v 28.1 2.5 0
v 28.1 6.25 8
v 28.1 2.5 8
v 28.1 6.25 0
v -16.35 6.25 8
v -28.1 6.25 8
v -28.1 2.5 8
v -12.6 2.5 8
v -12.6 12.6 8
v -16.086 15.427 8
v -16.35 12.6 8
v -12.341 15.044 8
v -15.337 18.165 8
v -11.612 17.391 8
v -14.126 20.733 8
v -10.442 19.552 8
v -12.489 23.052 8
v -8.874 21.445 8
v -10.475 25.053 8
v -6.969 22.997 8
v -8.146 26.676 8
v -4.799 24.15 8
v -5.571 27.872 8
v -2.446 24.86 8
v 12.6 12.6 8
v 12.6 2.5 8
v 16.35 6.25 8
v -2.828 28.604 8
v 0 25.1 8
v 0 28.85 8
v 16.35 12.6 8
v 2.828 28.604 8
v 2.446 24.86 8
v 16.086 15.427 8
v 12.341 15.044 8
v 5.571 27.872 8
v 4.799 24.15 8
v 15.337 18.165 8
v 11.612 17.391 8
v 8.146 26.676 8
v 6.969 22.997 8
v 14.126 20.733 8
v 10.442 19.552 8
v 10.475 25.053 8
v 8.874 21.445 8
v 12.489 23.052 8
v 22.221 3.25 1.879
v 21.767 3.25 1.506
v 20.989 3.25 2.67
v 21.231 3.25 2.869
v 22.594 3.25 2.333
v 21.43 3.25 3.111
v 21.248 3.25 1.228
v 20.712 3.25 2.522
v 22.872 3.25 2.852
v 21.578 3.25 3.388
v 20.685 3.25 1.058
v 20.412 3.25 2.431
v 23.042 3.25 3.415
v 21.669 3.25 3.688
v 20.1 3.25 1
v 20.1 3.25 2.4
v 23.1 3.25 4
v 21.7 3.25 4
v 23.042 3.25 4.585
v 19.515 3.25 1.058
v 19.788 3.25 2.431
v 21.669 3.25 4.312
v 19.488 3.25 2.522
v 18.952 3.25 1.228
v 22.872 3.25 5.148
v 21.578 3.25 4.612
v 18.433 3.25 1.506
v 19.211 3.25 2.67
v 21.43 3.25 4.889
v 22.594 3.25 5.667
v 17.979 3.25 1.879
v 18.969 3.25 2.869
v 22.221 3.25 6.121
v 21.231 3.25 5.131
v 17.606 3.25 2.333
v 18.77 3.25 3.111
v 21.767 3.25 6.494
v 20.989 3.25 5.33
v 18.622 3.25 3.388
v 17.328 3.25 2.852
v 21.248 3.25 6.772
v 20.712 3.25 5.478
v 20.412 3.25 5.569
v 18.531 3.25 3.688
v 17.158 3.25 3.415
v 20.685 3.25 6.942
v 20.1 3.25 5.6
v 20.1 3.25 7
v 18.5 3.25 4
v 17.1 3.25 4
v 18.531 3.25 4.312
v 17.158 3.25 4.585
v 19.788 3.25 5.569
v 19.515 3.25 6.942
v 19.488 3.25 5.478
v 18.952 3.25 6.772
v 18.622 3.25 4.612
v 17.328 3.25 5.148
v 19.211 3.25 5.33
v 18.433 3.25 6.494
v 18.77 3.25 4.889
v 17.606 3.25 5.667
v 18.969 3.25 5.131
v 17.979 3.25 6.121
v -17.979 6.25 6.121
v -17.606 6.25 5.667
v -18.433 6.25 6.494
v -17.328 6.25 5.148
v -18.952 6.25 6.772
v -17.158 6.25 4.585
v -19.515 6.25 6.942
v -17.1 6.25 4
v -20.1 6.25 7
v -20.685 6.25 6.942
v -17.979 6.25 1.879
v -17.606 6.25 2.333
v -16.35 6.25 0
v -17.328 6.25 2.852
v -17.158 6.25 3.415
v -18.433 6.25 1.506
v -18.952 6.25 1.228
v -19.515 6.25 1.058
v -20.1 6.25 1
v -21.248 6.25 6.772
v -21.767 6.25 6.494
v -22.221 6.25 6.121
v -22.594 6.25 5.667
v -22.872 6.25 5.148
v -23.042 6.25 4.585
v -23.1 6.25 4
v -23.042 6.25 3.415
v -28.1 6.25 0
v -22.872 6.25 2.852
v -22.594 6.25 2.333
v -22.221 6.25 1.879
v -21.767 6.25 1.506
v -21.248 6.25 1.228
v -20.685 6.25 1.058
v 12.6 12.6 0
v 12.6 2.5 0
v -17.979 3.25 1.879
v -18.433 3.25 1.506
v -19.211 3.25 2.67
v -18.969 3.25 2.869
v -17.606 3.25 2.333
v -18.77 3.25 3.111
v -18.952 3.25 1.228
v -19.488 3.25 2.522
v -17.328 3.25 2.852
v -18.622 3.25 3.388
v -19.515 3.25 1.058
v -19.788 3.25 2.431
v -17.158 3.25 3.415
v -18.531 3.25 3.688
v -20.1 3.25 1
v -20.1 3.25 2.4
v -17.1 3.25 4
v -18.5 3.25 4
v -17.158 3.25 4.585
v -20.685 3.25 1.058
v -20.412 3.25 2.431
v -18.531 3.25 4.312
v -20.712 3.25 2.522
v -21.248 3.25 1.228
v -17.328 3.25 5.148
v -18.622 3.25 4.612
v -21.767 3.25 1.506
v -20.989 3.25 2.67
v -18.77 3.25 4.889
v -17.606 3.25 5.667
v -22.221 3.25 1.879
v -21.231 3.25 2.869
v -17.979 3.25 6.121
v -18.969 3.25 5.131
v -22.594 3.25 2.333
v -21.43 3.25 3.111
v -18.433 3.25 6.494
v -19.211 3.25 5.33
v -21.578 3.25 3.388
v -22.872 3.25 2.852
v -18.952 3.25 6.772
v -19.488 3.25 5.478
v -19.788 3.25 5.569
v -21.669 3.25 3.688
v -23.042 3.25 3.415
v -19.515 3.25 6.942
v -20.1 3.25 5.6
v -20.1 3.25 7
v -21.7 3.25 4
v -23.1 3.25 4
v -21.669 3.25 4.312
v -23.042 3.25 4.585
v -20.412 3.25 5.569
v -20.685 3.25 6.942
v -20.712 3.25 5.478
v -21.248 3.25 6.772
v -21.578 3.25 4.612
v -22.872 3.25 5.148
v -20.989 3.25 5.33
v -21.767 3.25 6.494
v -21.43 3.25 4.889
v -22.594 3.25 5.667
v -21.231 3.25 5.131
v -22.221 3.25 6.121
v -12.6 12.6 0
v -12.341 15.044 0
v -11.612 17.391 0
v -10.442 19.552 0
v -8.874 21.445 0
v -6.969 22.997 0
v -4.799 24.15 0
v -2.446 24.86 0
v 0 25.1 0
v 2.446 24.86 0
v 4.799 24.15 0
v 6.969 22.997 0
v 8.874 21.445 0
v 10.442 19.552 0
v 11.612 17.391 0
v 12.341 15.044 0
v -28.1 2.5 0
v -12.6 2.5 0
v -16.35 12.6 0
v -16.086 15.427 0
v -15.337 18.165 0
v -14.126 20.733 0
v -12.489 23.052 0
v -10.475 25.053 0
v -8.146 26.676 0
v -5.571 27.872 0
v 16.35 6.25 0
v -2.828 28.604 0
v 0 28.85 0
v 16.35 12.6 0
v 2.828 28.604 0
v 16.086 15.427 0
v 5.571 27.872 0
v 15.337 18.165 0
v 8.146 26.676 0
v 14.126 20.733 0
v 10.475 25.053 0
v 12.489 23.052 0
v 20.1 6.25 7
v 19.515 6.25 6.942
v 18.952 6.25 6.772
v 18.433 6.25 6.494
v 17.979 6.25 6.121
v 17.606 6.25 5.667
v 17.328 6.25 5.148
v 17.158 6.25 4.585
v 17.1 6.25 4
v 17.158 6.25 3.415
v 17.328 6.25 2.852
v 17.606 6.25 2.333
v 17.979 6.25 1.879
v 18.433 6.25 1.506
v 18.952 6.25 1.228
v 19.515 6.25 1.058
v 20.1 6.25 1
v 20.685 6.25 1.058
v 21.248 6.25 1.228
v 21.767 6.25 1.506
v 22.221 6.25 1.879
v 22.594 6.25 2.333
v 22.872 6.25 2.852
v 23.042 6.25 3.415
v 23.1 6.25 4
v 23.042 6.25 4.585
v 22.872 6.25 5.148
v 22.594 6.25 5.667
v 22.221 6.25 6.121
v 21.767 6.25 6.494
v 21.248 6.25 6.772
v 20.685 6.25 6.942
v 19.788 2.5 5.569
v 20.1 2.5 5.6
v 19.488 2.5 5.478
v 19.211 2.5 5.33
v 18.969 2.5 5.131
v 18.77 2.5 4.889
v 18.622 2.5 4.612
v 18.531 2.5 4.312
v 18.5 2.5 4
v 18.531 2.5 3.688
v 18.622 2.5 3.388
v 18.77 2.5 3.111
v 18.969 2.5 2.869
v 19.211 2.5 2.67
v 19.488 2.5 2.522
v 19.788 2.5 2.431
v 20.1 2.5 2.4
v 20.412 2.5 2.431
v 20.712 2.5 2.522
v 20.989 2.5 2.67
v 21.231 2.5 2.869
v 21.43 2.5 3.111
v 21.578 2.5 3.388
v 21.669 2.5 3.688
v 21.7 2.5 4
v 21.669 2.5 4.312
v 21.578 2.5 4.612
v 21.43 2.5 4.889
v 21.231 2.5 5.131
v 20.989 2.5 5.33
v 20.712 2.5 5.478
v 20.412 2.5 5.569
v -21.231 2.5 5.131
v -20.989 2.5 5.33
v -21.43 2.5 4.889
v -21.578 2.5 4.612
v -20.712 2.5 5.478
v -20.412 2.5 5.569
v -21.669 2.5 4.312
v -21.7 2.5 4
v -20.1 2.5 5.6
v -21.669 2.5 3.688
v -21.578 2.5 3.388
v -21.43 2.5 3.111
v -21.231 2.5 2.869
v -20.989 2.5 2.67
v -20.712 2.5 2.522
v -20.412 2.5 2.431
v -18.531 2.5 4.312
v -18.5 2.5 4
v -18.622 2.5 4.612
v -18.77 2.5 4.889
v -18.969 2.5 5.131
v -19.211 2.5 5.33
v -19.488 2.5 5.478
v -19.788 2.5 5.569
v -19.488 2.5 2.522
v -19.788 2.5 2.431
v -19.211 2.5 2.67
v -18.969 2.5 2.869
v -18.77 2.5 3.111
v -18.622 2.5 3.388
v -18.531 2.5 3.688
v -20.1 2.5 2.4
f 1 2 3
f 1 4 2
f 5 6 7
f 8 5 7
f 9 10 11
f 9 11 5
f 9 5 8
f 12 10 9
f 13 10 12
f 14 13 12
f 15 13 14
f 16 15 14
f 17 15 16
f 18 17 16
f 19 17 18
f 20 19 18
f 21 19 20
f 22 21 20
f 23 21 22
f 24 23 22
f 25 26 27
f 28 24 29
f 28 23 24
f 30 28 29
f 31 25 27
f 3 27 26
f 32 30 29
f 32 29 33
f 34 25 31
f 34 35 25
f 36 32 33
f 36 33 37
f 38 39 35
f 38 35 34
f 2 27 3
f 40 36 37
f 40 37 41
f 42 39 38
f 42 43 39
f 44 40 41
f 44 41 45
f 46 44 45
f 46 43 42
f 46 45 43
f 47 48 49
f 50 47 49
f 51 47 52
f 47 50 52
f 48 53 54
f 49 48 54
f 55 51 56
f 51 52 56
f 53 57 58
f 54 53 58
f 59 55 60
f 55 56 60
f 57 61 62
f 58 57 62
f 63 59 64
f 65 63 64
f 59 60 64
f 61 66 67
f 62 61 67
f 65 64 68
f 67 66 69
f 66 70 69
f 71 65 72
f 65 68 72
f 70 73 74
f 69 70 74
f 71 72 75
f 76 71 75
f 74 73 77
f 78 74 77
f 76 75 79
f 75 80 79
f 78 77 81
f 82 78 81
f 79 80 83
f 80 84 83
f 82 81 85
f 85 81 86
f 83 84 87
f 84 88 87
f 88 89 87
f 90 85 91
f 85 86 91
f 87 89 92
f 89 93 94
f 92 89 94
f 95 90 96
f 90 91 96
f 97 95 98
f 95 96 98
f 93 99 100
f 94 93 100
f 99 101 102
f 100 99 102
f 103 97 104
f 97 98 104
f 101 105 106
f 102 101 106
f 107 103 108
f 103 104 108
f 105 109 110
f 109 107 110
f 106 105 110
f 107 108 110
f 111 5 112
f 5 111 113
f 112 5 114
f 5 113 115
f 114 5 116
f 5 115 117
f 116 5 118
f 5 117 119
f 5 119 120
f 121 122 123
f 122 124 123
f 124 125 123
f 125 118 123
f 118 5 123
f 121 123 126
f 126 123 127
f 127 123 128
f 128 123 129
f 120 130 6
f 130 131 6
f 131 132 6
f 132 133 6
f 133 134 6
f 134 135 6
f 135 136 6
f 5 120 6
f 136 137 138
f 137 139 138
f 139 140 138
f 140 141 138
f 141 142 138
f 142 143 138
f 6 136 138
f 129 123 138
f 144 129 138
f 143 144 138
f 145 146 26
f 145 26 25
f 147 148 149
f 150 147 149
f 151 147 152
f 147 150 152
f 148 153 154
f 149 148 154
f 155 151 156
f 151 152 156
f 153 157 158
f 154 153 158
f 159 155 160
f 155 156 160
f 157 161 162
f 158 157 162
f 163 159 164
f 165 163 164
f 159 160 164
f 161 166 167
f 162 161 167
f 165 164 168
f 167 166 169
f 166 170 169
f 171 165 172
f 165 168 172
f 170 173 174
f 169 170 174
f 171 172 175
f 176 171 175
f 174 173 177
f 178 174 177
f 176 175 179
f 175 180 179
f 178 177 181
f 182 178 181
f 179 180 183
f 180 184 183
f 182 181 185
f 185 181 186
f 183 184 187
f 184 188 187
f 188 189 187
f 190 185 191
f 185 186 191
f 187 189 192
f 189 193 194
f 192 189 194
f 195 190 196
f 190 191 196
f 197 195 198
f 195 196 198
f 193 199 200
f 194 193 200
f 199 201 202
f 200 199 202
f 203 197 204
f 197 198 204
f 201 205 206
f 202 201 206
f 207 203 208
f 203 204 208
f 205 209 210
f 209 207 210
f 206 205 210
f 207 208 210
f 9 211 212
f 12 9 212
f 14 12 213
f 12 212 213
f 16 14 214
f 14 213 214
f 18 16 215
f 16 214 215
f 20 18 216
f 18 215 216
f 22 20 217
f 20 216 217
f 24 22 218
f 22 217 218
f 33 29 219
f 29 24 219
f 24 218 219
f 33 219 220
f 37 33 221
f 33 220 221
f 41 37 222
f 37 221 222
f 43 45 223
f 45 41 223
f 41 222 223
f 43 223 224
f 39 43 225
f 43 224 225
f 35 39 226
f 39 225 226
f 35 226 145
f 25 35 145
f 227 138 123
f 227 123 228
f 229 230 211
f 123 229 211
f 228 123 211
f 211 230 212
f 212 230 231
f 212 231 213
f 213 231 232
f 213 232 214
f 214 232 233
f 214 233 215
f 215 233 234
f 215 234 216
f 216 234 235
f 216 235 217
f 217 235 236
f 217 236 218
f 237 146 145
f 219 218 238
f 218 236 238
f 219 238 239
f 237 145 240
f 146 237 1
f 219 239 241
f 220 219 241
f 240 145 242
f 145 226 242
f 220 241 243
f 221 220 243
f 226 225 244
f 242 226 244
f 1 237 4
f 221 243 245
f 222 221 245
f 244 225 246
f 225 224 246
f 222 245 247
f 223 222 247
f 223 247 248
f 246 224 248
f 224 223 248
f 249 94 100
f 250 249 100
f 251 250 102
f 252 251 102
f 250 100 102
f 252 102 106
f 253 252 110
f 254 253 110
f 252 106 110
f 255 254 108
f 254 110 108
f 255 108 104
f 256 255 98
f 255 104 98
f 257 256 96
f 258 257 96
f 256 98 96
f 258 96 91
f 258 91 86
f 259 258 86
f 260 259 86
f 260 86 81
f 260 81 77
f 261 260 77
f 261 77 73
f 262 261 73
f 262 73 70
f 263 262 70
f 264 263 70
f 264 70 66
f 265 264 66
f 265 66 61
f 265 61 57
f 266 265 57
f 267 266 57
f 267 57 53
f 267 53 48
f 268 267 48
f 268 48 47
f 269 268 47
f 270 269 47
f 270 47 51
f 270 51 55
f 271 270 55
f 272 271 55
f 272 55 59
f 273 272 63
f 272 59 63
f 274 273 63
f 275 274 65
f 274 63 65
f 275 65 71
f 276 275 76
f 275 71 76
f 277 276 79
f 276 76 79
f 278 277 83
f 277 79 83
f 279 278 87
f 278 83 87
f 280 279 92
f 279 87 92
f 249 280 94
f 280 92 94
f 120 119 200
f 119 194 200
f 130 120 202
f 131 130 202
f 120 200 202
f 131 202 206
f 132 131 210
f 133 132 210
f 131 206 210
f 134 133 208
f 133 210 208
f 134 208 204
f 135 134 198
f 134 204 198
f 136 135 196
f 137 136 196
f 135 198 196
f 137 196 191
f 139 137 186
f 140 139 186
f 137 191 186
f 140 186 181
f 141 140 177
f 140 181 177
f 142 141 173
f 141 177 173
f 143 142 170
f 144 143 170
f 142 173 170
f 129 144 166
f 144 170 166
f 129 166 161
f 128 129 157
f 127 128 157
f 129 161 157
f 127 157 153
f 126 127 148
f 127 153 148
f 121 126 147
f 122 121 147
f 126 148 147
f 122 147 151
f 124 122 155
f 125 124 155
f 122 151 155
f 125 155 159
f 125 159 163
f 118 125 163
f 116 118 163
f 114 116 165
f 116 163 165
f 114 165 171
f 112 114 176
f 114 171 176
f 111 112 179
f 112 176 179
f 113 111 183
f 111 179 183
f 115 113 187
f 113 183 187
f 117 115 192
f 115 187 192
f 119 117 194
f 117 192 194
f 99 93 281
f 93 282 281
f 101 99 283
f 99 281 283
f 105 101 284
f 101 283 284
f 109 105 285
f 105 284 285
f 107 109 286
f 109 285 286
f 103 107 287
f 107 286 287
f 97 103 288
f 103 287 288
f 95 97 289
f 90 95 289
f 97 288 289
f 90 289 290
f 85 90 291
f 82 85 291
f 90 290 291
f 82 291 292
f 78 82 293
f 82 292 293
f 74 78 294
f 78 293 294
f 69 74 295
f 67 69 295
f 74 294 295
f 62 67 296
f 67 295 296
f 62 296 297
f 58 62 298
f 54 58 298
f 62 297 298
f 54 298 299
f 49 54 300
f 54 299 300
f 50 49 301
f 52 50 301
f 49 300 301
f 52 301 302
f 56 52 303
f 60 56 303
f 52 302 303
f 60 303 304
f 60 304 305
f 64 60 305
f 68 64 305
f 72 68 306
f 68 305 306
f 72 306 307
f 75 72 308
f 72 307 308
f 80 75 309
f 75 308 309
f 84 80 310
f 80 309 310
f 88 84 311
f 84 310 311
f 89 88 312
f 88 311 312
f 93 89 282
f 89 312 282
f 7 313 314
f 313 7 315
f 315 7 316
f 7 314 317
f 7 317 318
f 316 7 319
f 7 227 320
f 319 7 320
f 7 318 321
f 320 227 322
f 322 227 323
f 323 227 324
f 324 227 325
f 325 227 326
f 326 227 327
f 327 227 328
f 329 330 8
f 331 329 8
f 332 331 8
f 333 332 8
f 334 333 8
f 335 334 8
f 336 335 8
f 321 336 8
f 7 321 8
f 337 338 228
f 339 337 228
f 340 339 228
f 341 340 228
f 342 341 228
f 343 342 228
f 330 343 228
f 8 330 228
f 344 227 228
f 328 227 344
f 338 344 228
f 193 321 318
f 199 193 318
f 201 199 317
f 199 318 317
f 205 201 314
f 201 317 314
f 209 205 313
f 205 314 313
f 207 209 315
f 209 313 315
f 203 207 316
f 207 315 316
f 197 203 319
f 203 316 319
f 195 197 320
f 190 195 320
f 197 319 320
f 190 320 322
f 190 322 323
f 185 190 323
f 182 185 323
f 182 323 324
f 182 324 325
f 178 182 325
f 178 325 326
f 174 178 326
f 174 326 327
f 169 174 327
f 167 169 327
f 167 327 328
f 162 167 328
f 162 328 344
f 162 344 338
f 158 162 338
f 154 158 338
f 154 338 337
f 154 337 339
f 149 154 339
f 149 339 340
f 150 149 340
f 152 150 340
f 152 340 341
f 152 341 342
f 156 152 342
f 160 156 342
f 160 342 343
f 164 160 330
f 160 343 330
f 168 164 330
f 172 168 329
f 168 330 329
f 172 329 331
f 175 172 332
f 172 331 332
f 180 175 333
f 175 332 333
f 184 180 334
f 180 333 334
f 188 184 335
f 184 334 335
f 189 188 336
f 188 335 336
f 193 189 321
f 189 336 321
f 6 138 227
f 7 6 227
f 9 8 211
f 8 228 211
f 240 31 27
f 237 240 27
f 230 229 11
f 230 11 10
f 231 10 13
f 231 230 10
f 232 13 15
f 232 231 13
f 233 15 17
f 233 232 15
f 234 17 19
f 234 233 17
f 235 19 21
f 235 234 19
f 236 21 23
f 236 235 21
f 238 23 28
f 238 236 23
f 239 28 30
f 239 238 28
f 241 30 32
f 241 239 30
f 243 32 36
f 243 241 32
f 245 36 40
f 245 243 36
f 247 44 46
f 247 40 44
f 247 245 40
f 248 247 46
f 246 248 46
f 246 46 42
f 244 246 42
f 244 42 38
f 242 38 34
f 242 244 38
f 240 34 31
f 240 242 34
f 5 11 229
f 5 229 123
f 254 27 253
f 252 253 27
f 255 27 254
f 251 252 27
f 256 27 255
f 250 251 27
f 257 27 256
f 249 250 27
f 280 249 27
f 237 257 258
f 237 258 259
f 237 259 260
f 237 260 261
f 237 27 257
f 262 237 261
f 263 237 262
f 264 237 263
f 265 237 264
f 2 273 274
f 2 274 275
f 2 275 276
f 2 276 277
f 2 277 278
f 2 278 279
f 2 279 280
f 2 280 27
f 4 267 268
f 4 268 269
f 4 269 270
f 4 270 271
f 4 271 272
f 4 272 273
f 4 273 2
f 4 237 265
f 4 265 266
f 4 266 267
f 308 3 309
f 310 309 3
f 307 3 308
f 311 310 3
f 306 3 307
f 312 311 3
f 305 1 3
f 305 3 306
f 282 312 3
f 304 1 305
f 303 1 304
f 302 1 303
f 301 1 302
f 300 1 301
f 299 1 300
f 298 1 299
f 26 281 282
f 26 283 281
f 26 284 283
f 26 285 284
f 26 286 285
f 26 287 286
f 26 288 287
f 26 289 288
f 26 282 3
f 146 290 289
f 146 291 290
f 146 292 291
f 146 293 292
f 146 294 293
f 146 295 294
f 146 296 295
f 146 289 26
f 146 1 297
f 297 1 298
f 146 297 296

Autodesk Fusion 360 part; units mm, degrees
sketch "Sketch1" plane through (0, 0, 0) normal (0, 0, 1) x (1, 0, 0)
  line L0 (0, 0) -> (0, 25.1) construction
  line L1 (-28.1, 2.5) -> (-12.6, 2.5)
  line L2 (-12.6, 2.5) -> (-12.6, 12.6)
  line L3 (-16.3497, 12.6) -> (-28.1, 12.6)
  line L4 (-28.1, 12.6) -> (-28.1, 2.5)
  line L5 (28.1, 12.6) -> (28.1, 2.5)
  line L6 (16.3497, 12.6) -> (28.1, 12.6)
  line L7 (28.1, 2.5) -> (12.6, 2.5)
  line L8 (12.6, 2.5) -> (12.6, 12.6)
  arc A0 (16.3497, 12.6) -> (-16.3497, 12.6) centre (0, 12.5) ccw
  arc A1 (12.6, 12.5) -> (-12.6, 12.5) centre (0, 12.5) ccw
  line L9 (-28.1, 12.6) -> (-16.35, 12.6)
  line L10 (-16.35, 12.6) -> (-16.35, 6.25)
  line L11 (-16.35, 6.25) -> (-28.1, 6.25)
  line L12 (-28.1, 6.25) -> (-28.1, 12.6)
  line L13 (28.1, 12.6) -> (16.35, 12.6)
  line L14 (16.35, 6.25) -> (28.1, 6.25)
  line L15 (16.35, 12.6) -> (16.35, 6.25)
  point P0 (0, 12.5)
  point P1 (-12.6, 12.6)
  point P2 (-28.1, 2.5)
  point P3 (12.6, 12.6)
  point P4 (-28.1, 2.5)
  point P5 (-20.1, 6.15)
  point P6 (-16.35, 12.5)
  point P7 (20.1, 6.15)
  dimension "d1" = 25.2
  dimension "d2" = 32.7
  dimension "d3" = 11.75
  dimension "d4" = 6.35
extrude "Extrude1" add sketch "Sketch1" along normal blind 8 contours L1 L2 L4 L5 L7 L8 A0 A1 L10 L11 L14 L15
sketch "Sketch2" plane through (0, 6.25, 0) normal (0, 1, 0) x (-1, 0, 0)
  line L0 (16.35, 0) -> (28.1, 0)
  line L1 (28.1, 0) -> (28.1, 8)
  line L2 (28.1, 8) -> (16.35, 8)
  line L3 (16.35, 8) -> (16.35, 0)
  line L4 (0, 8) -> (0, 0) construction
  point P0 (20.1, 4)
  point P1 (-20.1, 4)
hole "Hole1" at (-20.1, 6.25, 4) at (20.1, 6.25, 4) direction (0, -1, 0) diameter 3.2 end through all counterbore diameter 6 counterbore depth 3
